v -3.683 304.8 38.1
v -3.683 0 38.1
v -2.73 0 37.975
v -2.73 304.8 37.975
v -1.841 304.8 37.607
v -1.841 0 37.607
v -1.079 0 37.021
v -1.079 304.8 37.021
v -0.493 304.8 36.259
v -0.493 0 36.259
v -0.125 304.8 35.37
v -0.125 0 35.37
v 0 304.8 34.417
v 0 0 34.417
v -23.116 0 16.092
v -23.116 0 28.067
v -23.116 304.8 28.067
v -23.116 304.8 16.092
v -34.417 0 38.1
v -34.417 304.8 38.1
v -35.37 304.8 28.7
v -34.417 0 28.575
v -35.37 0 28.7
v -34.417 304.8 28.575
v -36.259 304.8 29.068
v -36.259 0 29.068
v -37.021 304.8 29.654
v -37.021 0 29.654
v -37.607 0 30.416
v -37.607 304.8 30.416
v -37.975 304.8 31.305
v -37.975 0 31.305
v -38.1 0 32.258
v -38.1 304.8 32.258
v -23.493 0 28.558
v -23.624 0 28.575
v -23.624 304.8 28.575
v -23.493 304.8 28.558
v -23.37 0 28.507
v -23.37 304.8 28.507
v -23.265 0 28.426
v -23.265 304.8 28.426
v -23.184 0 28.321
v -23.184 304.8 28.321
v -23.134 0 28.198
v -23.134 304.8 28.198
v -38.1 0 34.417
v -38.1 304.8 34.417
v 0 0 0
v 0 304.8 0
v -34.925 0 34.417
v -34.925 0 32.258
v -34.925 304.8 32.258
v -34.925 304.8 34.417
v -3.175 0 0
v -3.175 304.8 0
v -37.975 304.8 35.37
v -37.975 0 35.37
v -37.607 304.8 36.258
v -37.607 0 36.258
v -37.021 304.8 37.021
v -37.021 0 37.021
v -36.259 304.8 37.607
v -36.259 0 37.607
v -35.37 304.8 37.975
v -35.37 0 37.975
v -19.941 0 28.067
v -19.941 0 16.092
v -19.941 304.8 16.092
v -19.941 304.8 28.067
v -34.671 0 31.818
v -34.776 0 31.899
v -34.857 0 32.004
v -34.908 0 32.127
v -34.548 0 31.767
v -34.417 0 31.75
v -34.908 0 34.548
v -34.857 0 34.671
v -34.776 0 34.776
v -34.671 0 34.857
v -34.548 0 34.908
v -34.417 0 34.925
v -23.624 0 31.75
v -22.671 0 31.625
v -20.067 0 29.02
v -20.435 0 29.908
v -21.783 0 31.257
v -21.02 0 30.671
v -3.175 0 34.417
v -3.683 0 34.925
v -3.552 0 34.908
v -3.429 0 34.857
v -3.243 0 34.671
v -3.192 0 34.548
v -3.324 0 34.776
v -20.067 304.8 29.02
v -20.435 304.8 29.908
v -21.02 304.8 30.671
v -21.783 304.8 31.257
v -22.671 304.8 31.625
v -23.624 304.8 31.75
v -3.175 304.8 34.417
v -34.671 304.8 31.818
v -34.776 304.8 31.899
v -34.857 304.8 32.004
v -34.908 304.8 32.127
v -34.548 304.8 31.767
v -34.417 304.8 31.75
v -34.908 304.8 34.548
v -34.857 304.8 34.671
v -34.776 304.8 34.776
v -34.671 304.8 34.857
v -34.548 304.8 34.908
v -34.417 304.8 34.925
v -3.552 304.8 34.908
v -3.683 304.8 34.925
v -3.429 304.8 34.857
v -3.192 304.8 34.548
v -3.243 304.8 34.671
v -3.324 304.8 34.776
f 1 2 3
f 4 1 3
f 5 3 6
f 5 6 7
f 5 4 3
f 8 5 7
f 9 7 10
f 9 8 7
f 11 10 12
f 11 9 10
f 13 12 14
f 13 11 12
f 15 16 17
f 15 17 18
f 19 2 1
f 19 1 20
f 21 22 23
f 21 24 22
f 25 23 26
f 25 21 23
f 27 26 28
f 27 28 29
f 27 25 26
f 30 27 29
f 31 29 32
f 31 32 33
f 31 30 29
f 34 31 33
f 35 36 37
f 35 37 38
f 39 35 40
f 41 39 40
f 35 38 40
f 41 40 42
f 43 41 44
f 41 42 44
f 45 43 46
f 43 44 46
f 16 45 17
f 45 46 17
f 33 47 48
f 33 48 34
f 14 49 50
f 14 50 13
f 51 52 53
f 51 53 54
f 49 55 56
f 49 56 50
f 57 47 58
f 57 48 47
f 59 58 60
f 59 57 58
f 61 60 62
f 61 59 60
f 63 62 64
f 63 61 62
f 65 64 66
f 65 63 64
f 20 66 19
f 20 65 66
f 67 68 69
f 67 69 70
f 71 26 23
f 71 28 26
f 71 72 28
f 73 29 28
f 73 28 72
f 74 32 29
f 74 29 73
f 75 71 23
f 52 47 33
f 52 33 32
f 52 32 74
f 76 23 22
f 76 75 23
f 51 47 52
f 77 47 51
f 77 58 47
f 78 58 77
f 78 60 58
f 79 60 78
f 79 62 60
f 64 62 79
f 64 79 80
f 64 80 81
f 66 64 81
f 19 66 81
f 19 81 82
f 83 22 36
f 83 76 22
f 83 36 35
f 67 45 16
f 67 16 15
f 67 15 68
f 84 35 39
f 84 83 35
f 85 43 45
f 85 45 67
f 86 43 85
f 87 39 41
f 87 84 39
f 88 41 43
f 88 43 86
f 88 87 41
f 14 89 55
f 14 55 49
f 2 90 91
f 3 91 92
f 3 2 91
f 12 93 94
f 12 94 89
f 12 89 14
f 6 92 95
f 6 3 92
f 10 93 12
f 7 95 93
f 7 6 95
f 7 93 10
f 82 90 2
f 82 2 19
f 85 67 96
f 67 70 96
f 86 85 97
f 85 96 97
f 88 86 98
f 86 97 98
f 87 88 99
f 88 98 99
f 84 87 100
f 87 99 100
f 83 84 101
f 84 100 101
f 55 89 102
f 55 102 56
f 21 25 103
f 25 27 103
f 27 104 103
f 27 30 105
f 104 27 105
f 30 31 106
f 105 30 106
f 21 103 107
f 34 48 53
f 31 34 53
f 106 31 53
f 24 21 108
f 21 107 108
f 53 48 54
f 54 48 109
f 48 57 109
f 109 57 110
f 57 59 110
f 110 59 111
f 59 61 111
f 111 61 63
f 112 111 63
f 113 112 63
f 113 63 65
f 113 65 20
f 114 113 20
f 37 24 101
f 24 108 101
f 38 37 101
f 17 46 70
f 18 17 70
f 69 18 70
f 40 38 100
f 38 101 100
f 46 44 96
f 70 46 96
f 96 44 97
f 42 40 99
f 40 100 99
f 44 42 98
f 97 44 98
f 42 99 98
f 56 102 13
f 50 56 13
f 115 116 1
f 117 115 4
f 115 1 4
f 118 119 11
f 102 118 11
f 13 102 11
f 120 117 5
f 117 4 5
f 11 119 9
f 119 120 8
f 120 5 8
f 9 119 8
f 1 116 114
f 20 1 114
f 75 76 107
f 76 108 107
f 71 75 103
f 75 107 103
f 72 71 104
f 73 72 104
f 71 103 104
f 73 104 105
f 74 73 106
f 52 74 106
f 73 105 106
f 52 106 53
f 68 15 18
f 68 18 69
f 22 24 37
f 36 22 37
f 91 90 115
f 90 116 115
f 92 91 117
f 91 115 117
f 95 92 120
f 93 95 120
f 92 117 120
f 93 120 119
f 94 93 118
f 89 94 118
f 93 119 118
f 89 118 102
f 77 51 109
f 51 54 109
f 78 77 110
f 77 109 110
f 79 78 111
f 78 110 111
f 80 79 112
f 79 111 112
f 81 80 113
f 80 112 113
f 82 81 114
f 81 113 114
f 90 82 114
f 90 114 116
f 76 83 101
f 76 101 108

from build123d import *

# Parameters (mm, degrees)
F1_DEPTH = 304.8
F2_R     = 0.508
F3_R     = 3.683


with BuildPart() as f1:
    # F0 (on Front) → F1 (new body)
    with BuildSketch(Plane.XZ):
        Polygon((-3.175, 0), (0, 0), (0, 38.1), (-38.1, 38.1), (-38.1, 28.575), (-23.116228, 28.575), (-23.116228, 16.091942), (-19.941228, 16.091942), (-19.941228, 31.75), (-34.925, 31.75), (-34.925, 34.925), (-3.175, 34.925), align=None)
    extrude(amount=-F1_DEPTH)

    # F2
    f2_edges = [f1.edges().sort_by_distance(p)[0] for p in [
        (-34.925, 152.4, 31.75),
        (-34.925, 152.4, 34.925),
        (-3.175, 152.4, 34.925),
        (-23.116228, 152.4, 28.575),
    ]]
    fillet(f2_edges, radius=F2_R)

    # F3
    f3_edges = [f1.edges().sort_by_distance(p)[0] for p in [
        (-38.1, 152.4, 38.1),
        (0, 152.4, 38.1),
        (-19.941228, 152.4, 31.75),
        (-38.1, 152.4, 28.575),
    ]]
    fillet(f3_edges, radius=F3_R)


solid = f1.part
